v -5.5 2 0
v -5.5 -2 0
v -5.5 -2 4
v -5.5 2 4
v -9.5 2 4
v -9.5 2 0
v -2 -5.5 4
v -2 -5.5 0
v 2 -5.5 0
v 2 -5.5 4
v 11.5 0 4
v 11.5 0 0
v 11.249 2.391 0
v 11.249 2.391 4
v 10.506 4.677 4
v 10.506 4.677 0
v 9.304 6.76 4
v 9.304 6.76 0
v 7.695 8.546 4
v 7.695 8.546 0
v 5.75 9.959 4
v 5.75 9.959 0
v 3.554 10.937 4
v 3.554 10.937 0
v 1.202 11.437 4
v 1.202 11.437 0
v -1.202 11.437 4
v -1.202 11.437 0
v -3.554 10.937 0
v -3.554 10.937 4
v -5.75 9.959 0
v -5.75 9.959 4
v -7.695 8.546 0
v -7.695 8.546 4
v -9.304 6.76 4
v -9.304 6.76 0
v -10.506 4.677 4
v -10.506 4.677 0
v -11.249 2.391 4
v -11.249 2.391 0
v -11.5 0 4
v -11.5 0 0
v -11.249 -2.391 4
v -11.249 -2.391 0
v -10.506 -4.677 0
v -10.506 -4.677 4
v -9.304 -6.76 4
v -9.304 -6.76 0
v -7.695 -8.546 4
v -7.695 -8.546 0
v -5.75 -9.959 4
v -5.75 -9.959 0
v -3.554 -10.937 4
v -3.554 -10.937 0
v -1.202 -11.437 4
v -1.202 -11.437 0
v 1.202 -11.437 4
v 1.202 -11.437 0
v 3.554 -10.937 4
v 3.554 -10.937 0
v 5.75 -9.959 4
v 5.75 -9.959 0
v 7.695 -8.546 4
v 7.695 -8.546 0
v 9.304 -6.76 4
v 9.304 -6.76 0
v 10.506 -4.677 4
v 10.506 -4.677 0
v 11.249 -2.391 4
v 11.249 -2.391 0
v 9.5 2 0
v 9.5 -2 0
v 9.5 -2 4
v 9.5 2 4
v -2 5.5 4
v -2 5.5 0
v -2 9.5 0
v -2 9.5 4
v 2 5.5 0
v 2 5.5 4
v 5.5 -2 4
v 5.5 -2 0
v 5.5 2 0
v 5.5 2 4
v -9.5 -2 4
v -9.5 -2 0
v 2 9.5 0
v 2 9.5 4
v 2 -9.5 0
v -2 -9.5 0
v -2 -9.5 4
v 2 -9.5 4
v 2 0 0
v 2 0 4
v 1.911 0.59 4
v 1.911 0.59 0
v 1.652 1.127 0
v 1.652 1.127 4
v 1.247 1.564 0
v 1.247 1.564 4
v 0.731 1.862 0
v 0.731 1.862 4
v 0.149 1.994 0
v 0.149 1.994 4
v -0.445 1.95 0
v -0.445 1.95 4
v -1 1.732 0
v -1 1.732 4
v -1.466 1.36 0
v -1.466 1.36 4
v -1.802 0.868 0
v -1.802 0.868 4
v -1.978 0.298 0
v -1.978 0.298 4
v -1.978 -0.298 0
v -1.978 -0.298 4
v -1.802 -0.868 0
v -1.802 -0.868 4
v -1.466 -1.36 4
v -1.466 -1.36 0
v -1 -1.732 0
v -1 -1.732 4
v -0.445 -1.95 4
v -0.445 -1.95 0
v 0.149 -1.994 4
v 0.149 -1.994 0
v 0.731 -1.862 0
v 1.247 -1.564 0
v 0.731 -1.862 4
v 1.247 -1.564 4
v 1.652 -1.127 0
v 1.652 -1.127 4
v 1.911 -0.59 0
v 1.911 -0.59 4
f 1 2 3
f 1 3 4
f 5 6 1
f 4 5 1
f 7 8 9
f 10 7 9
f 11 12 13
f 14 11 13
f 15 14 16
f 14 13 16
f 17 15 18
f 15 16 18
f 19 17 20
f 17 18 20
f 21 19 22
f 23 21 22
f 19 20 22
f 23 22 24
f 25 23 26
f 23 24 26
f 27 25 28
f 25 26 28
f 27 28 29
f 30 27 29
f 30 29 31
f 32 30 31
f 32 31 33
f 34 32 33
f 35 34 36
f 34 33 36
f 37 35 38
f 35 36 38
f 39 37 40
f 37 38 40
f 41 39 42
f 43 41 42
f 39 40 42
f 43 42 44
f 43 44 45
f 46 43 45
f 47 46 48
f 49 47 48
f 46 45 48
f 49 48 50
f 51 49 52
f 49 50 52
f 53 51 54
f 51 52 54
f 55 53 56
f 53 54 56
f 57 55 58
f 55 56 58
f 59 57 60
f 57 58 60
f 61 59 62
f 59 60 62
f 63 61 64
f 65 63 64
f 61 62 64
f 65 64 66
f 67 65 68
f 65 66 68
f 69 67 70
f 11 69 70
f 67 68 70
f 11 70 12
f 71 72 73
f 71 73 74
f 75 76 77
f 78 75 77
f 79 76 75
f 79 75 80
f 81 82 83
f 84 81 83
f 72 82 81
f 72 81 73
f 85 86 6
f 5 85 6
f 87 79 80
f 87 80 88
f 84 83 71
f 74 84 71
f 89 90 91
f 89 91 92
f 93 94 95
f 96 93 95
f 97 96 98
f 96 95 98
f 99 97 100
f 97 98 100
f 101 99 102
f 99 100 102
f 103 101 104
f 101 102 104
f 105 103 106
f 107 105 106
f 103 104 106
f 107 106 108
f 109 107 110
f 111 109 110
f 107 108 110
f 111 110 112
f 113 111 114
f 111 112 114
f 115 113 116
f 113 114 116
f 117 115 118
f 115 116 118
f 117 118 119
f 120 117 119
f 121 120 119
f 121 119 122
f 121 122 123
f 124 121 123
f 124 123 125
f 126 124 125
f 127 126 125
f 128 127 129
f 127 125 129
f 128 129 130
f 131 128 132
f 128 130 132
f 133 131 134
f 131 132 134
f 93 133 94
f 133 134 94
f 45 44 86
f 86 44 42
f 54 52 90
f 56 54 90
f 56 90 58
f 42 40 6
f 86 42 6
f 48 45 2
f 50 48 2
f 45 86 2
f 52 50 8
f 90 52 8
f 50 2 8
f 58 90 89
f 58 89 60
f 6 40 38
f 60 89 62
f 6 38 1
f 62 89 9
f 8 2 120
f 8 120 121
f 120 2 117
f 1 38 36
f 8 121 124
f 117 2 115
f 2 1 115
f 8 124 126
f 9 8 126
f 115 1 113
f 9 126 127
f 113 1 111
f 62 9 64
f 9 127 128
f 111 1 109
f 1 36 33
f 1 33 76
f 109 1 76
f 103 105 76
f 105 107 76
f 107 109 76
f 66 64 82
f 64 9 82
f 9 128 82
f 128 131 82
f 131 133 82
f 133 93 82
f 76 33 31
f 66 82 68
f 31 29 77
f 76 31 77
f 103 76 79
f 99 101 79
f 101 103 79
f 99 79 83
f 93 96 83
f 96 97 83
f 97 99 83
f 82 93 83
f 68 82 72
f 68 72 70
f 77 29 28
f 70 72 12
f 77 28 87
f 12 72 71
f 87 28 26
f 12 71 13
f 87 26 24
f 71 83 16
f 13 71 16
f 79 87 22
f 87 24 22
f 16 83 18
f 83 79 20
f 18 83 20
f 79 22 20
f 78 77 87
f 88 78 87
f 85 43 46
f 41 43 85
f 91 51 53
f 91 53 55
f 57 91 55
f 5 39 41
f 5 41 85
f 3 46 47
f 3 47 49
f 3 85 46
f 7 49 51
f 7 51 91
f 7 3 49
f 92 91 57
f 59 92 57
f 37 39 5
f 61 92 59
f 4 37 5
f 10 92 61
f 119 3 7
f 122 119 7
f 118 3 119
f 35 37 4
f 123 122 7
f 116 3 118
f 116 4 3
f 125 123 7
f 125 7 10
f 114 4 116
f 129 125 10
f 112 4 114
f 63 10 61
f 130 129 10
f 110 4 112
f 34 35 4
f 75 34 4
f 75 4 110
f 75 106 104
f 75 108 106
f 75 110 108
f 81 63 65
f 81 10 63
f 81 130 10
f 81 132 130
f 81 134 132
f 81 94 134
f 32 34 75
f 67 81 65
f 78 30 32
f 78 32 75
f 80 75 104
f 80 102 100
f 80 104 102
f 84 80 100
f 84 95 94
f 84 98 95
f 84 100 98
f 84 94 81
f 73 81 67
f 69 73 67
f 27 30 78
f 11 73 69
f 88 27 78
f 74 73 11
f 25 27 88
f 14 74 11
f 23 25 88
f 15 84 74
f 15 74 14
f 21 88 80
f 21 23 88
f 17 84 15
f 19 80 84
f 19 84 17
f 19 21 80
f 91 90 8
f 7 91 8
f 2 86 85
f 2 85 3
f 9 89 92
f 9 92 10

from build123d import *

# Parameters (mm, degrees)
SKETCH1_R           = 11.5
SKETCH1_W           = 4
SKETCH1_H           = 4
BOSS_EXTRUDE1_DEPTH = 4
SKETCH2_R           = 2
CUT_EXTRUDE1_DEPTH  = 4


with BuildPart() as part:
    # Sketch1 → Boss-Extrude1 (new body)
    with BuildSketch(Plane.XY):
        Circle(SKETCH1_R)
        with Locations((0, 7.5)):
            Rectangle(SKETCH1_W, SKETCH1_H, mode=Mode.SUBTRACT)
        with Locations((7.5, 0)):
            Rectangle(SKETCH1_W, SKETCH1_H, mode=Mode.SUBTRACT)
        with Locations((0, -7.5)):
            Rectangle(SKETCH1_W, SKETCH1_H, mode=Mode.SUBTRACT)
        with Locations((-7.5, 0)):
            Rectangle(SKETCH1_W, SKETCH1_H, mode=Mode.SUBTRACT)
    extrude(amount=BOSS_EXTRUDE1_DEPTH)

    # Sketch2 → Cut-Extrude1 (cut)
    with BuildSketch(Plane.XY.offset(4)):
        Circle(SKETCH2_R)
    extrude(amount=-CUT_EXTRUDE1_DEPTH, mode=Mode.SUBTRACT)


solid = part.part
